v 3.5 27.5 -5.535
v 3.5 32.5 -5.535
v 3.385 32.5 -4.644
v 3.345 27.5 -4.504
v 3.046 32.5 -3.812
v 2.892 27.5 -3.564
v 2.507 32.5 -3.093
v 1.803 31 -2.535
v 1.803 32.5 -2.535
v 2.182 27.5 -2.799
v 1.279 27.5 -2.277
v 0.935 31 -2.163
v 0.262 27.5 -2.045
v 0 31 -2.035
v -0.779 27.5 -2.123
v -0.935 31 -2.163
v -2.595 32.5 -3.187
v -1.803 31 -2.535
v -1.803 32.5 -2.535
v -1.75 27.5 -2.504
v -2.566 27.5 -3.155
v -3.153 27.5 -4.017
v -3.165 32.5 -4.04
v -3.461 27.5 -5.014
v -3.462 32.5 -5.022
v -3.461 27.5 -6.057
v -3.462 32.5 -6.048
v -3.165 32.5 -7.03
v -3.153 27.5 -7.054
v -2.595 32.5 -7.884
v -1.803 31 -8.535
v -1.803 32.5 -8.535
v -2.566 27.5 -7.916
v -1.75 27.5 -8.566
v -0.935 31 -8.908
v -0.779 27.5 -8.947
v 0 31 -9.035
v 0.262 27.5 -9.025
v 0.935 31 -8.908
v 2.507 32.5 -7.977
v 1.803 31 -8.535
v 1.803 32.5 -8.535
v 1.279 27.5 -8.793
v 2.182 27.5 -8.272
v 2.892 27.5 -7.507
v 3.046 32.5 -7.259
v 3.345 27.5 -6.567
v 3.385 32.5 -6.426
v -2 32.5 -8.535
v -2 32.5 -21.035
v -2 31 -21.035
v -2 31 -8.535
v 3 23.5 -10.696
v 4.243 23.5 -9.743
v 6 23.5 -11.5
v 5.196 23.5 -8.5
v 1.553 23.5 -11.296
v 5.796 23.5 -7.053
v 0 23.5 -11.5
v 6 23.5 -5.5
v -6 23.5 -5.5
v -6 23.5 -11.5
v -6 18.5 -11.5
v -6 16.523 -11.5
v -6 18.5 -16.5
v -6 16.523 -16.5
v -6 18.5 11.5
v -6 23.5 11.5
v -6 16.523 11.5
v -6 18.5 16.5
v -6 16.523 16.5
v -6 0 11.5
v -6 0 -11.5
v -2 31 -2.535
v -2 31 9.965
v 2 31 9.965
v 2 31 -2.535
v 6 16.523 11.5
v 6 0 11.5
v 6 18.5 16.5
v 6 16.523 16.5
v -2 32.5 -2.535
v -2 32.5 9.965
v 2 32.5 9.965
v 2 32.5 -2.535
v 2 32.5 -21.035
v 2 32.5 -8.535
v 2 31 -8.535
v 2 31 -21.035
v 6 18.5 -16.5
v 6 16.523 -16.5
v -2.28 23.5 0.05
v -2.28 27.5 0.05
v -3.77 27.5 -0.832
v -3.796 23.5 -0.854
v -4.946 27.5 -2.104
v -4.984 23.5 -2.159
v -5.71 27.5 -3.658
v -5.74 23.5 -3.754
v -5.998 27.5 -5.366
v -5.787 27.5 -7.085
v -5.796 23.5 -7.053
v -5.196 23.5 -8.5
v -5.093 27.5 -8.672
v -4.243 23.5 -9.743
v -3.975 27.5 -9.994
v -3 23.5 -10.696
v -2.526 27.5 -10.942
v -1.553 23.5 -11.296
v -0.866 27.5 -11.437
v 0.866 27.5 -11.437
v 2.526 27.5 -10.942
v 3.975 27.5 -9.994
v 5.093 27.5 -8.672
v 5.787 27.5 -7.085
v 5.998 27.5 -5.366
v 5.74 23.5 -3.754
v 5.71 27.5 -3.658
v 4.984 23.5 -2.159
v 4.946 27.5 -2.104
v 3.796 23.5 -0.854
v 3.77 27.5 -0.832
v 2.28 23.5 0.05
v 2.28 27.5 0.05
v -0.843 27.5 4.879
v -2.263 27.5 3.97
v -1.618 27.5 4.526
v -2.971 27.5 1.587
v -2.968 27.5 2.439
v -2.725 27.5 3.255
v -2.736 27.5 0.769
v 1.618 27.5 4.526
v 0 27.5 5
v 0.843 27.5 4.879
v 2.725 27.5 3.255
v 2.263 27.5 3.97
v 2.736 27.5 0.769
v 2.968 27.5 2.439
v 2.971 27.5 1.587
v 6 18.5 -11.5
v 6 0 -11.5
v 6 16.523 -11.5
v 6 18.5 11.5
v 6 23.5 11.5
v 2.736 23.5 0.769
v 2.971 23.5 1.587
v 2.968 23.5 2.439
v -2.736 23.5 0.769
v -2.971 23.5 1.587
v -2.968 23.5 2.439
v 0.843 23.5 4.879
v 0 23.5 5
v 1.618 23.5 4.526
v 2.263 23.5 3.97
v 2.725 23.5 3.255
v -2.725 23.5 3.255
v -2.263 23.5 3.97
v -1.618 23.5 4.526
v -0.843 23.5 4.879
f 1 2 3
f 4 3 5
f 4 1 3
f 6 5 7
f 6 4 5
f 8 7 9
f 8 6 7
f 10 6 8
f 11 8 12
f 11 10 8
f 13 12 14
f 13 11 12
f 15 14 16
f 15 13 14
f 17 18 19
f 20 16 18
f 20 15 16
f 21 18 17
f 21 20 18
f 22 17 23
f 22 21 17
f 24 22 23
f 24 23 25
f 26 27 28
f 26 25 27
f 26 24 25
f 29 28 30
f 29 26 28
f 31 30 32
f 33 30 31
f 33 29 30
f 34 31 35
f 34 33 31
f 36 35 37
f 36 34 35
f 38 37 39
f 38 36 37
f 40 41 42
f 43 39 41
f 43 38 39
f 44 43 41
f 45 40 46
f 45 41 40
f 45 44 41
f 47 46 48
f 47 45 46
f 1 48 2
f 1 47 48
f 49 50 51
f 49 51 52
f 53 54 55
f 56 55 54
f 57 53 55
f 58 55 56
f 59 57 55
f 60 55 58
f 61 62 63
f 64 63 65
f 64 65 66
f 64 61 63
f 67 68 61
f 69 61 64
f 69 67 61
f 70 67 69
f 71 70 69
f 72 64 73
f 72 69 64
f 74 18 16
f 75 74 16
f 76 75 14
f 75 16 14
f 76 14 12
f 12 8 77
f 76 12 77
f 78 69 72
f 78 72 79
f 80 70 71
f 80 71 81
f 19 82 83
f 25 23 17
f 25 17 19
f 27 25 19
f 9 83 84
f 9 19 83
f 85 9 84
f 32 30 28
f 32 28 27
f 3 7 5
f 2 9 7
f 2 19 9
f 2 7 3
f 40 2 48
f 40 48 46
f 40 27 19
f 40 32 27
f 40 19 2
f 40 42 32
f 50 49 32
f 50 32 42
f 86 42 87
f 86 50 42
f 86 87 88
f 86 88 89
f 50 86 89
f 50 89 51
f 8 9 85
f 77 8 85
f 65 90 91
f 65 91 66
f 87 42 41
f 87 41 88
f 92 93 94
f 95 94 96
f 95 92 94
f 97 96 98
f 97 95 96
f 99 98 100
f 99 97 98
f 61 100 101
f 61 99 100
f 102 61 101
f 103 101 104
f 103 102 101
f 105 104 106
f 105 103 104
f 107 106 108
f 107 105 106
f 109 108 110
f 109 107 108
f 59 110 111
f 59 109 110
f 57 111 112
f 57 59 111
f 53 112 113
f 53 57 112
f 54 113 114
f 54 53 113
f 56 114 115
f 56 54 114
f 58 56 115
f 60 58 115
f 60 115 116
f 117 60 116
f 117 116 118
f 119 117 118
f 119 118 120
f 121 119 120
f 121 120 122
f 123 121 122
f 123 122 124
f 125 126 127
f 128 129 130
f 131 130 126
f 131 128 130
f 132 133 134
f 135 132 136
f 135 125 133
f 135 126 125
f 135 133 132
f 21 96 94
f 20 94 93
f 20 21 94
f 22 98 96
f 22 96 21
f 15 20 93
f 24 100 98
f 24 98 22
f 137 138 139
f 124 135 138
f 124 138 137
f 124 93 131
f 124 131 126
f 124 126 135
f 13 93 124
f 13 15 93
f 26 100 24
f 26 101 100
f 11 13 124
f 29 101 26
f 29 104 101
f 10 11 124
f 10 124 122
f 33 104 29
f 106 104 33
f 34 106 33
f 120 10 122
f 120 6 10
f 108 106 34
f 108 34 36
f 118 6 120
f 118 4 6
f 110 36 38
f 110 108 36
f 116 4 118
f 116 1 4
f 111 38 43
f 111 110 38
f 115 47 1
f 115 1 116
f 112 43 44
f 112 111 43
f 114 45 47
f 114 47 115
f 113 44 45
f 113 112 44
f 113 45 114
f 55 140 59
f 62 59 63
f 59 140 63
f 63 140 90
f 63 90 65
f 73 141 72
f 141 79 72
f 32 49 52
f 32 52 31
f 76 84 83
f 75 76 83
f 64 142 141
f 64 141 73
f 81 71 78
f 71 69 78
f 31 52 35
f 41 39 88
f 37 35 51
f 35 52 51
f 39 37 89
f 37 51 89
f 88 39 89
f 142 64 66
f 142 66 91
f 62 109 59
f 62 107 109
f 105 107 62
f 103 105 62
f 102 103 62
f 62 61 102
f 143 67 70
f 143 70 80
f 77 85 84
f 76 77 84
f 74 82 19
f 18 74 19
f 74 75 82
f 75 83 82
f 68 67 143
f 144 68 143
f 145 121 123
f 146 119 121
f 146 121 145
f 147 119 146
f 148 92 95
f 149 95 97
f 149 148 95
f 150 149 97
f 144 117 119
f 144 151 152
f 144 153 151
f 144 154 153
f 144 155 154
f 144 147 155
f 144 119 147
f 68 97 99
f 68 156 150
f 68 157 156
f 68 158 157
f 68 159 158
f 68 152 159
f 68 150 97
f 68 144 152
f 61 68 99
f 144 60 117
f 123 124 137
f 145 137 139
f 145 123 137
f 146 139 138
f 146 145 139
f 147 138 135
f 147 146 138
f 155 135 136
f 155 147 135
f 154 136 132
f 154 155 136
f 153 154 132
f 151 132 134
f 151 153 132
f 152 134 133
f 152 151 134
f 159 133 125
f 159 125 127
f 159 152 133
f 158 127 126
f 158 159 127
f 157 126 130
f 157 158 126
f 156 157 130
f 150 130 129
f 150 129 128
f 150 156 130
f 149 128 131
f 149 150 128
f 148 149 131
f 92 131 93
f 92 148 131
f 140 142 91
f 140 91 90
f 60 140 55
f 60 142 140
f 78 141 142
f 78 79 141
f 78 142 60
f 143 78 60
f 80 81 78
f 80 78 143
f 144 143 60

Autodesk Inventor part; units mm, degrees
ref_plane "YZ Plane" through (0, 0, 0) normal (1, 0, 0) x (0, 1, 0)
ref_plane "XZ Plane" through (0, 0, 0) normal (0, 1, 0) x (-1, 0, 0)
ref_plane "XY Plane" through (0, 0, 0) normal (0, 0, 1) x (1, 0, 0)
sketch "Sketch1" plane through (0, 0, 0) normal (0, 1, 0) x (-1, 0, 0)
  line L0 (-6, -11.5) -> (6, -11.5)
  line L1 (6, -11.5) -> (6, 11.5)
  line L2 (6, 11.5) -> (-6, 11.5)
  line L3 (-6, 11.5) -> (-6, -11.5)
  line L4 (-6, -11.5) -> (6, 11.5) construction
  line L5 (6, -11.5) -> (-6, 11.5) construction
  point P0 (0, 0)
  dimension "d0" = 12
  dimension "d1" = 23
extrude "Extrusion1" add sketch "Sketch1" along normal blind 23.5
sketch "Sketch2" plane through (-6, 0, -11.5) normal (-1, 0, 0) x (0, 0, 1)
  line L0 (0, 23.5) -> (23, 23.5) projected
  line L1 (0, 18.5) -> (23, 18.5)
  line L2 (0, 18.5) -> (0, 16.523)
  line L3 (0, 16.523) -> (23, 16.523)
  line L4 (23, 16.523) -> (23, 18.5)
  point P0 (11.5, 0)
  dimension "d7" = 5
extrude "Extrusion2" add sketch "Sketch2" along normal blind 5
sketch "Sketch3" plane through (6, 0, 11.5) normal (1, 0, 0) x (0, 0, -1)
  line L0 (0, 16.523) -> (0, 18.5) projected
  line L1 (0, 18.5) -> (23, 18.5) projected
  line L2 (23, 18.5) -> (23, 16.523) projected
  line L3 (23, 16.523) -> (0, 16.523) projected
  point P0 (11.5, 0)
extrude "Extrusion3" add sketch "Sketch3" along normal blind 5
sketch "Sketch4" plane through (0, 23.5, 0) normal (0, 1, 0) x (1, 0, 0)
  circle A0 centre (0, 5.5) radius 6
  line L0 (6, 11.5) -> (-6, 11.5) projected
  point P0 (0, 0)
  dimension "d12" = 12
  dimension "d13" = 6
extrude "Extrusion4" add sketch "Sketch4" along normal blind 4
sketch "Sketch6" plane through (0, 23.5, 0) normal (0, 1, 0) x (1, 0, 0)
  circle A0 centre (0, -2) radius 3
  point P0 (0, 0)
  dimension "d17" = 6
extrude "Extrusion5" add sketch "Sketch6" along normal up to surface (4 mm away)
sketch "Sketch7" plane through (-6, 0, 11.5) normal (0, 0, 1) x (1, 0, 0)
  line L0 (12, 18.5) -> (17, 18.5) projected
  line L1 (0, 18.5) -> (-5, 18.5) projected
  line L2 (0, 16.523) -> (-5, 16.523) projected
  line L3 (12, 16.523) -> (17, 16.523) projected
  line L4 (0, 18.5) -> (0, 16.523)
  line L5 (0, 16.523) -> (12, 16.523)
  line L6 (12, 16.523) -> (12, 18.5)
  line L7 (0, 18.5) -> (12, 18.5)
  point P0 (6, 0)
extrude "Extrusion6" add sketch "Sketch7" along normal blind 5
sketch "Sketch8" plane through (6, 0, -11.5) normal (0, 0, -1) x (-1, 0, 0)
  line L0 (0, 18.5) -> (12, 18.5) projected
  line L1 (12, 18.5) -> (12, 16.523) projected
  line L2 (12, 16.523) -> (0, 16.523) projected
  line L3 (0, 16.523) -> (0, 18.5) projected
  point P0 (6, 0)
extrude "Extrusion7" add sketch "Sketch8" along normal blind 5
sketch "Sketch9" plane through (11, 0, 11.5) normal (1, 0, 0) x (0, 0, -1)
  line L0 (23, 16.523) -> (23, 18.5) projected
  line L1 (23, 18.5) -> (0, 18.5) projected
  line L2 (0, 18.5) -> (0, 16.523) projected
  line L3 (0, 16.523) -> (23, 16.523) projected
  point P0 (11.5, 0)
extrude "Extrusion8" cut sketch "Sketch9" against normal up to surface (5 mm away)
sketch "Sketch10" plane through (-11, 0, -11.5) normal (-1, 0, 0) x (0, 0, 1)
  line L0 (23, 16.523) -> (23, 18.5) projected
  line L1 (23, 18.5) -> (0, 18.5) projected
  line L2 (0, 18.5) -> (0, 16.523) projected
  line L3 (0, 16.523) -> (23, 16.523) projected
  point P0 (11.5, 0)
extrude "Extrusion9" cut sketch "Sketch10" against normal up to surface (5 mm away)
sketch "Sketch11" plane through (0, 27.5, 0) normal (0, 1, 0) x (1, 0, 0)
  circle A0 centre (0, 5.5352) radius 3.5
  point P0 (0, 0)
  dimension "d28" = 7
extrude "Extrusion10" add sketch "Sketch11" along normal blind 5
sketch "Sketch14" plane through (0, 32.5, -5.5352) normal (0, 1, 0) x (1, 0, 0)
  line L0 (-2, -3) -> (2, -3)
  line L1 (2, -3) -> (2, -15.5)
  line L2 (2, -15.5) -> (-2, -15.5)
  line L3 (-2, -15.5) -> (-2, -3)
  line L4 (-2, 3) -> (2, 3)
  line L5 (2, 3) -> (2, 15.5)
  line L6 (2, 15.5) -> (-2, 15.5)
  line L7 (-2, 15.5) -> (-2, 3)
  point P0 (0, -5.5352)
  dimension "d39" = 12.5
  dimension "d40" = 12.5
extrude "Extrusion13" add sketch "Sketch14" against normal blind 1.5
properties part number "Servo" material "S355J2+N"
